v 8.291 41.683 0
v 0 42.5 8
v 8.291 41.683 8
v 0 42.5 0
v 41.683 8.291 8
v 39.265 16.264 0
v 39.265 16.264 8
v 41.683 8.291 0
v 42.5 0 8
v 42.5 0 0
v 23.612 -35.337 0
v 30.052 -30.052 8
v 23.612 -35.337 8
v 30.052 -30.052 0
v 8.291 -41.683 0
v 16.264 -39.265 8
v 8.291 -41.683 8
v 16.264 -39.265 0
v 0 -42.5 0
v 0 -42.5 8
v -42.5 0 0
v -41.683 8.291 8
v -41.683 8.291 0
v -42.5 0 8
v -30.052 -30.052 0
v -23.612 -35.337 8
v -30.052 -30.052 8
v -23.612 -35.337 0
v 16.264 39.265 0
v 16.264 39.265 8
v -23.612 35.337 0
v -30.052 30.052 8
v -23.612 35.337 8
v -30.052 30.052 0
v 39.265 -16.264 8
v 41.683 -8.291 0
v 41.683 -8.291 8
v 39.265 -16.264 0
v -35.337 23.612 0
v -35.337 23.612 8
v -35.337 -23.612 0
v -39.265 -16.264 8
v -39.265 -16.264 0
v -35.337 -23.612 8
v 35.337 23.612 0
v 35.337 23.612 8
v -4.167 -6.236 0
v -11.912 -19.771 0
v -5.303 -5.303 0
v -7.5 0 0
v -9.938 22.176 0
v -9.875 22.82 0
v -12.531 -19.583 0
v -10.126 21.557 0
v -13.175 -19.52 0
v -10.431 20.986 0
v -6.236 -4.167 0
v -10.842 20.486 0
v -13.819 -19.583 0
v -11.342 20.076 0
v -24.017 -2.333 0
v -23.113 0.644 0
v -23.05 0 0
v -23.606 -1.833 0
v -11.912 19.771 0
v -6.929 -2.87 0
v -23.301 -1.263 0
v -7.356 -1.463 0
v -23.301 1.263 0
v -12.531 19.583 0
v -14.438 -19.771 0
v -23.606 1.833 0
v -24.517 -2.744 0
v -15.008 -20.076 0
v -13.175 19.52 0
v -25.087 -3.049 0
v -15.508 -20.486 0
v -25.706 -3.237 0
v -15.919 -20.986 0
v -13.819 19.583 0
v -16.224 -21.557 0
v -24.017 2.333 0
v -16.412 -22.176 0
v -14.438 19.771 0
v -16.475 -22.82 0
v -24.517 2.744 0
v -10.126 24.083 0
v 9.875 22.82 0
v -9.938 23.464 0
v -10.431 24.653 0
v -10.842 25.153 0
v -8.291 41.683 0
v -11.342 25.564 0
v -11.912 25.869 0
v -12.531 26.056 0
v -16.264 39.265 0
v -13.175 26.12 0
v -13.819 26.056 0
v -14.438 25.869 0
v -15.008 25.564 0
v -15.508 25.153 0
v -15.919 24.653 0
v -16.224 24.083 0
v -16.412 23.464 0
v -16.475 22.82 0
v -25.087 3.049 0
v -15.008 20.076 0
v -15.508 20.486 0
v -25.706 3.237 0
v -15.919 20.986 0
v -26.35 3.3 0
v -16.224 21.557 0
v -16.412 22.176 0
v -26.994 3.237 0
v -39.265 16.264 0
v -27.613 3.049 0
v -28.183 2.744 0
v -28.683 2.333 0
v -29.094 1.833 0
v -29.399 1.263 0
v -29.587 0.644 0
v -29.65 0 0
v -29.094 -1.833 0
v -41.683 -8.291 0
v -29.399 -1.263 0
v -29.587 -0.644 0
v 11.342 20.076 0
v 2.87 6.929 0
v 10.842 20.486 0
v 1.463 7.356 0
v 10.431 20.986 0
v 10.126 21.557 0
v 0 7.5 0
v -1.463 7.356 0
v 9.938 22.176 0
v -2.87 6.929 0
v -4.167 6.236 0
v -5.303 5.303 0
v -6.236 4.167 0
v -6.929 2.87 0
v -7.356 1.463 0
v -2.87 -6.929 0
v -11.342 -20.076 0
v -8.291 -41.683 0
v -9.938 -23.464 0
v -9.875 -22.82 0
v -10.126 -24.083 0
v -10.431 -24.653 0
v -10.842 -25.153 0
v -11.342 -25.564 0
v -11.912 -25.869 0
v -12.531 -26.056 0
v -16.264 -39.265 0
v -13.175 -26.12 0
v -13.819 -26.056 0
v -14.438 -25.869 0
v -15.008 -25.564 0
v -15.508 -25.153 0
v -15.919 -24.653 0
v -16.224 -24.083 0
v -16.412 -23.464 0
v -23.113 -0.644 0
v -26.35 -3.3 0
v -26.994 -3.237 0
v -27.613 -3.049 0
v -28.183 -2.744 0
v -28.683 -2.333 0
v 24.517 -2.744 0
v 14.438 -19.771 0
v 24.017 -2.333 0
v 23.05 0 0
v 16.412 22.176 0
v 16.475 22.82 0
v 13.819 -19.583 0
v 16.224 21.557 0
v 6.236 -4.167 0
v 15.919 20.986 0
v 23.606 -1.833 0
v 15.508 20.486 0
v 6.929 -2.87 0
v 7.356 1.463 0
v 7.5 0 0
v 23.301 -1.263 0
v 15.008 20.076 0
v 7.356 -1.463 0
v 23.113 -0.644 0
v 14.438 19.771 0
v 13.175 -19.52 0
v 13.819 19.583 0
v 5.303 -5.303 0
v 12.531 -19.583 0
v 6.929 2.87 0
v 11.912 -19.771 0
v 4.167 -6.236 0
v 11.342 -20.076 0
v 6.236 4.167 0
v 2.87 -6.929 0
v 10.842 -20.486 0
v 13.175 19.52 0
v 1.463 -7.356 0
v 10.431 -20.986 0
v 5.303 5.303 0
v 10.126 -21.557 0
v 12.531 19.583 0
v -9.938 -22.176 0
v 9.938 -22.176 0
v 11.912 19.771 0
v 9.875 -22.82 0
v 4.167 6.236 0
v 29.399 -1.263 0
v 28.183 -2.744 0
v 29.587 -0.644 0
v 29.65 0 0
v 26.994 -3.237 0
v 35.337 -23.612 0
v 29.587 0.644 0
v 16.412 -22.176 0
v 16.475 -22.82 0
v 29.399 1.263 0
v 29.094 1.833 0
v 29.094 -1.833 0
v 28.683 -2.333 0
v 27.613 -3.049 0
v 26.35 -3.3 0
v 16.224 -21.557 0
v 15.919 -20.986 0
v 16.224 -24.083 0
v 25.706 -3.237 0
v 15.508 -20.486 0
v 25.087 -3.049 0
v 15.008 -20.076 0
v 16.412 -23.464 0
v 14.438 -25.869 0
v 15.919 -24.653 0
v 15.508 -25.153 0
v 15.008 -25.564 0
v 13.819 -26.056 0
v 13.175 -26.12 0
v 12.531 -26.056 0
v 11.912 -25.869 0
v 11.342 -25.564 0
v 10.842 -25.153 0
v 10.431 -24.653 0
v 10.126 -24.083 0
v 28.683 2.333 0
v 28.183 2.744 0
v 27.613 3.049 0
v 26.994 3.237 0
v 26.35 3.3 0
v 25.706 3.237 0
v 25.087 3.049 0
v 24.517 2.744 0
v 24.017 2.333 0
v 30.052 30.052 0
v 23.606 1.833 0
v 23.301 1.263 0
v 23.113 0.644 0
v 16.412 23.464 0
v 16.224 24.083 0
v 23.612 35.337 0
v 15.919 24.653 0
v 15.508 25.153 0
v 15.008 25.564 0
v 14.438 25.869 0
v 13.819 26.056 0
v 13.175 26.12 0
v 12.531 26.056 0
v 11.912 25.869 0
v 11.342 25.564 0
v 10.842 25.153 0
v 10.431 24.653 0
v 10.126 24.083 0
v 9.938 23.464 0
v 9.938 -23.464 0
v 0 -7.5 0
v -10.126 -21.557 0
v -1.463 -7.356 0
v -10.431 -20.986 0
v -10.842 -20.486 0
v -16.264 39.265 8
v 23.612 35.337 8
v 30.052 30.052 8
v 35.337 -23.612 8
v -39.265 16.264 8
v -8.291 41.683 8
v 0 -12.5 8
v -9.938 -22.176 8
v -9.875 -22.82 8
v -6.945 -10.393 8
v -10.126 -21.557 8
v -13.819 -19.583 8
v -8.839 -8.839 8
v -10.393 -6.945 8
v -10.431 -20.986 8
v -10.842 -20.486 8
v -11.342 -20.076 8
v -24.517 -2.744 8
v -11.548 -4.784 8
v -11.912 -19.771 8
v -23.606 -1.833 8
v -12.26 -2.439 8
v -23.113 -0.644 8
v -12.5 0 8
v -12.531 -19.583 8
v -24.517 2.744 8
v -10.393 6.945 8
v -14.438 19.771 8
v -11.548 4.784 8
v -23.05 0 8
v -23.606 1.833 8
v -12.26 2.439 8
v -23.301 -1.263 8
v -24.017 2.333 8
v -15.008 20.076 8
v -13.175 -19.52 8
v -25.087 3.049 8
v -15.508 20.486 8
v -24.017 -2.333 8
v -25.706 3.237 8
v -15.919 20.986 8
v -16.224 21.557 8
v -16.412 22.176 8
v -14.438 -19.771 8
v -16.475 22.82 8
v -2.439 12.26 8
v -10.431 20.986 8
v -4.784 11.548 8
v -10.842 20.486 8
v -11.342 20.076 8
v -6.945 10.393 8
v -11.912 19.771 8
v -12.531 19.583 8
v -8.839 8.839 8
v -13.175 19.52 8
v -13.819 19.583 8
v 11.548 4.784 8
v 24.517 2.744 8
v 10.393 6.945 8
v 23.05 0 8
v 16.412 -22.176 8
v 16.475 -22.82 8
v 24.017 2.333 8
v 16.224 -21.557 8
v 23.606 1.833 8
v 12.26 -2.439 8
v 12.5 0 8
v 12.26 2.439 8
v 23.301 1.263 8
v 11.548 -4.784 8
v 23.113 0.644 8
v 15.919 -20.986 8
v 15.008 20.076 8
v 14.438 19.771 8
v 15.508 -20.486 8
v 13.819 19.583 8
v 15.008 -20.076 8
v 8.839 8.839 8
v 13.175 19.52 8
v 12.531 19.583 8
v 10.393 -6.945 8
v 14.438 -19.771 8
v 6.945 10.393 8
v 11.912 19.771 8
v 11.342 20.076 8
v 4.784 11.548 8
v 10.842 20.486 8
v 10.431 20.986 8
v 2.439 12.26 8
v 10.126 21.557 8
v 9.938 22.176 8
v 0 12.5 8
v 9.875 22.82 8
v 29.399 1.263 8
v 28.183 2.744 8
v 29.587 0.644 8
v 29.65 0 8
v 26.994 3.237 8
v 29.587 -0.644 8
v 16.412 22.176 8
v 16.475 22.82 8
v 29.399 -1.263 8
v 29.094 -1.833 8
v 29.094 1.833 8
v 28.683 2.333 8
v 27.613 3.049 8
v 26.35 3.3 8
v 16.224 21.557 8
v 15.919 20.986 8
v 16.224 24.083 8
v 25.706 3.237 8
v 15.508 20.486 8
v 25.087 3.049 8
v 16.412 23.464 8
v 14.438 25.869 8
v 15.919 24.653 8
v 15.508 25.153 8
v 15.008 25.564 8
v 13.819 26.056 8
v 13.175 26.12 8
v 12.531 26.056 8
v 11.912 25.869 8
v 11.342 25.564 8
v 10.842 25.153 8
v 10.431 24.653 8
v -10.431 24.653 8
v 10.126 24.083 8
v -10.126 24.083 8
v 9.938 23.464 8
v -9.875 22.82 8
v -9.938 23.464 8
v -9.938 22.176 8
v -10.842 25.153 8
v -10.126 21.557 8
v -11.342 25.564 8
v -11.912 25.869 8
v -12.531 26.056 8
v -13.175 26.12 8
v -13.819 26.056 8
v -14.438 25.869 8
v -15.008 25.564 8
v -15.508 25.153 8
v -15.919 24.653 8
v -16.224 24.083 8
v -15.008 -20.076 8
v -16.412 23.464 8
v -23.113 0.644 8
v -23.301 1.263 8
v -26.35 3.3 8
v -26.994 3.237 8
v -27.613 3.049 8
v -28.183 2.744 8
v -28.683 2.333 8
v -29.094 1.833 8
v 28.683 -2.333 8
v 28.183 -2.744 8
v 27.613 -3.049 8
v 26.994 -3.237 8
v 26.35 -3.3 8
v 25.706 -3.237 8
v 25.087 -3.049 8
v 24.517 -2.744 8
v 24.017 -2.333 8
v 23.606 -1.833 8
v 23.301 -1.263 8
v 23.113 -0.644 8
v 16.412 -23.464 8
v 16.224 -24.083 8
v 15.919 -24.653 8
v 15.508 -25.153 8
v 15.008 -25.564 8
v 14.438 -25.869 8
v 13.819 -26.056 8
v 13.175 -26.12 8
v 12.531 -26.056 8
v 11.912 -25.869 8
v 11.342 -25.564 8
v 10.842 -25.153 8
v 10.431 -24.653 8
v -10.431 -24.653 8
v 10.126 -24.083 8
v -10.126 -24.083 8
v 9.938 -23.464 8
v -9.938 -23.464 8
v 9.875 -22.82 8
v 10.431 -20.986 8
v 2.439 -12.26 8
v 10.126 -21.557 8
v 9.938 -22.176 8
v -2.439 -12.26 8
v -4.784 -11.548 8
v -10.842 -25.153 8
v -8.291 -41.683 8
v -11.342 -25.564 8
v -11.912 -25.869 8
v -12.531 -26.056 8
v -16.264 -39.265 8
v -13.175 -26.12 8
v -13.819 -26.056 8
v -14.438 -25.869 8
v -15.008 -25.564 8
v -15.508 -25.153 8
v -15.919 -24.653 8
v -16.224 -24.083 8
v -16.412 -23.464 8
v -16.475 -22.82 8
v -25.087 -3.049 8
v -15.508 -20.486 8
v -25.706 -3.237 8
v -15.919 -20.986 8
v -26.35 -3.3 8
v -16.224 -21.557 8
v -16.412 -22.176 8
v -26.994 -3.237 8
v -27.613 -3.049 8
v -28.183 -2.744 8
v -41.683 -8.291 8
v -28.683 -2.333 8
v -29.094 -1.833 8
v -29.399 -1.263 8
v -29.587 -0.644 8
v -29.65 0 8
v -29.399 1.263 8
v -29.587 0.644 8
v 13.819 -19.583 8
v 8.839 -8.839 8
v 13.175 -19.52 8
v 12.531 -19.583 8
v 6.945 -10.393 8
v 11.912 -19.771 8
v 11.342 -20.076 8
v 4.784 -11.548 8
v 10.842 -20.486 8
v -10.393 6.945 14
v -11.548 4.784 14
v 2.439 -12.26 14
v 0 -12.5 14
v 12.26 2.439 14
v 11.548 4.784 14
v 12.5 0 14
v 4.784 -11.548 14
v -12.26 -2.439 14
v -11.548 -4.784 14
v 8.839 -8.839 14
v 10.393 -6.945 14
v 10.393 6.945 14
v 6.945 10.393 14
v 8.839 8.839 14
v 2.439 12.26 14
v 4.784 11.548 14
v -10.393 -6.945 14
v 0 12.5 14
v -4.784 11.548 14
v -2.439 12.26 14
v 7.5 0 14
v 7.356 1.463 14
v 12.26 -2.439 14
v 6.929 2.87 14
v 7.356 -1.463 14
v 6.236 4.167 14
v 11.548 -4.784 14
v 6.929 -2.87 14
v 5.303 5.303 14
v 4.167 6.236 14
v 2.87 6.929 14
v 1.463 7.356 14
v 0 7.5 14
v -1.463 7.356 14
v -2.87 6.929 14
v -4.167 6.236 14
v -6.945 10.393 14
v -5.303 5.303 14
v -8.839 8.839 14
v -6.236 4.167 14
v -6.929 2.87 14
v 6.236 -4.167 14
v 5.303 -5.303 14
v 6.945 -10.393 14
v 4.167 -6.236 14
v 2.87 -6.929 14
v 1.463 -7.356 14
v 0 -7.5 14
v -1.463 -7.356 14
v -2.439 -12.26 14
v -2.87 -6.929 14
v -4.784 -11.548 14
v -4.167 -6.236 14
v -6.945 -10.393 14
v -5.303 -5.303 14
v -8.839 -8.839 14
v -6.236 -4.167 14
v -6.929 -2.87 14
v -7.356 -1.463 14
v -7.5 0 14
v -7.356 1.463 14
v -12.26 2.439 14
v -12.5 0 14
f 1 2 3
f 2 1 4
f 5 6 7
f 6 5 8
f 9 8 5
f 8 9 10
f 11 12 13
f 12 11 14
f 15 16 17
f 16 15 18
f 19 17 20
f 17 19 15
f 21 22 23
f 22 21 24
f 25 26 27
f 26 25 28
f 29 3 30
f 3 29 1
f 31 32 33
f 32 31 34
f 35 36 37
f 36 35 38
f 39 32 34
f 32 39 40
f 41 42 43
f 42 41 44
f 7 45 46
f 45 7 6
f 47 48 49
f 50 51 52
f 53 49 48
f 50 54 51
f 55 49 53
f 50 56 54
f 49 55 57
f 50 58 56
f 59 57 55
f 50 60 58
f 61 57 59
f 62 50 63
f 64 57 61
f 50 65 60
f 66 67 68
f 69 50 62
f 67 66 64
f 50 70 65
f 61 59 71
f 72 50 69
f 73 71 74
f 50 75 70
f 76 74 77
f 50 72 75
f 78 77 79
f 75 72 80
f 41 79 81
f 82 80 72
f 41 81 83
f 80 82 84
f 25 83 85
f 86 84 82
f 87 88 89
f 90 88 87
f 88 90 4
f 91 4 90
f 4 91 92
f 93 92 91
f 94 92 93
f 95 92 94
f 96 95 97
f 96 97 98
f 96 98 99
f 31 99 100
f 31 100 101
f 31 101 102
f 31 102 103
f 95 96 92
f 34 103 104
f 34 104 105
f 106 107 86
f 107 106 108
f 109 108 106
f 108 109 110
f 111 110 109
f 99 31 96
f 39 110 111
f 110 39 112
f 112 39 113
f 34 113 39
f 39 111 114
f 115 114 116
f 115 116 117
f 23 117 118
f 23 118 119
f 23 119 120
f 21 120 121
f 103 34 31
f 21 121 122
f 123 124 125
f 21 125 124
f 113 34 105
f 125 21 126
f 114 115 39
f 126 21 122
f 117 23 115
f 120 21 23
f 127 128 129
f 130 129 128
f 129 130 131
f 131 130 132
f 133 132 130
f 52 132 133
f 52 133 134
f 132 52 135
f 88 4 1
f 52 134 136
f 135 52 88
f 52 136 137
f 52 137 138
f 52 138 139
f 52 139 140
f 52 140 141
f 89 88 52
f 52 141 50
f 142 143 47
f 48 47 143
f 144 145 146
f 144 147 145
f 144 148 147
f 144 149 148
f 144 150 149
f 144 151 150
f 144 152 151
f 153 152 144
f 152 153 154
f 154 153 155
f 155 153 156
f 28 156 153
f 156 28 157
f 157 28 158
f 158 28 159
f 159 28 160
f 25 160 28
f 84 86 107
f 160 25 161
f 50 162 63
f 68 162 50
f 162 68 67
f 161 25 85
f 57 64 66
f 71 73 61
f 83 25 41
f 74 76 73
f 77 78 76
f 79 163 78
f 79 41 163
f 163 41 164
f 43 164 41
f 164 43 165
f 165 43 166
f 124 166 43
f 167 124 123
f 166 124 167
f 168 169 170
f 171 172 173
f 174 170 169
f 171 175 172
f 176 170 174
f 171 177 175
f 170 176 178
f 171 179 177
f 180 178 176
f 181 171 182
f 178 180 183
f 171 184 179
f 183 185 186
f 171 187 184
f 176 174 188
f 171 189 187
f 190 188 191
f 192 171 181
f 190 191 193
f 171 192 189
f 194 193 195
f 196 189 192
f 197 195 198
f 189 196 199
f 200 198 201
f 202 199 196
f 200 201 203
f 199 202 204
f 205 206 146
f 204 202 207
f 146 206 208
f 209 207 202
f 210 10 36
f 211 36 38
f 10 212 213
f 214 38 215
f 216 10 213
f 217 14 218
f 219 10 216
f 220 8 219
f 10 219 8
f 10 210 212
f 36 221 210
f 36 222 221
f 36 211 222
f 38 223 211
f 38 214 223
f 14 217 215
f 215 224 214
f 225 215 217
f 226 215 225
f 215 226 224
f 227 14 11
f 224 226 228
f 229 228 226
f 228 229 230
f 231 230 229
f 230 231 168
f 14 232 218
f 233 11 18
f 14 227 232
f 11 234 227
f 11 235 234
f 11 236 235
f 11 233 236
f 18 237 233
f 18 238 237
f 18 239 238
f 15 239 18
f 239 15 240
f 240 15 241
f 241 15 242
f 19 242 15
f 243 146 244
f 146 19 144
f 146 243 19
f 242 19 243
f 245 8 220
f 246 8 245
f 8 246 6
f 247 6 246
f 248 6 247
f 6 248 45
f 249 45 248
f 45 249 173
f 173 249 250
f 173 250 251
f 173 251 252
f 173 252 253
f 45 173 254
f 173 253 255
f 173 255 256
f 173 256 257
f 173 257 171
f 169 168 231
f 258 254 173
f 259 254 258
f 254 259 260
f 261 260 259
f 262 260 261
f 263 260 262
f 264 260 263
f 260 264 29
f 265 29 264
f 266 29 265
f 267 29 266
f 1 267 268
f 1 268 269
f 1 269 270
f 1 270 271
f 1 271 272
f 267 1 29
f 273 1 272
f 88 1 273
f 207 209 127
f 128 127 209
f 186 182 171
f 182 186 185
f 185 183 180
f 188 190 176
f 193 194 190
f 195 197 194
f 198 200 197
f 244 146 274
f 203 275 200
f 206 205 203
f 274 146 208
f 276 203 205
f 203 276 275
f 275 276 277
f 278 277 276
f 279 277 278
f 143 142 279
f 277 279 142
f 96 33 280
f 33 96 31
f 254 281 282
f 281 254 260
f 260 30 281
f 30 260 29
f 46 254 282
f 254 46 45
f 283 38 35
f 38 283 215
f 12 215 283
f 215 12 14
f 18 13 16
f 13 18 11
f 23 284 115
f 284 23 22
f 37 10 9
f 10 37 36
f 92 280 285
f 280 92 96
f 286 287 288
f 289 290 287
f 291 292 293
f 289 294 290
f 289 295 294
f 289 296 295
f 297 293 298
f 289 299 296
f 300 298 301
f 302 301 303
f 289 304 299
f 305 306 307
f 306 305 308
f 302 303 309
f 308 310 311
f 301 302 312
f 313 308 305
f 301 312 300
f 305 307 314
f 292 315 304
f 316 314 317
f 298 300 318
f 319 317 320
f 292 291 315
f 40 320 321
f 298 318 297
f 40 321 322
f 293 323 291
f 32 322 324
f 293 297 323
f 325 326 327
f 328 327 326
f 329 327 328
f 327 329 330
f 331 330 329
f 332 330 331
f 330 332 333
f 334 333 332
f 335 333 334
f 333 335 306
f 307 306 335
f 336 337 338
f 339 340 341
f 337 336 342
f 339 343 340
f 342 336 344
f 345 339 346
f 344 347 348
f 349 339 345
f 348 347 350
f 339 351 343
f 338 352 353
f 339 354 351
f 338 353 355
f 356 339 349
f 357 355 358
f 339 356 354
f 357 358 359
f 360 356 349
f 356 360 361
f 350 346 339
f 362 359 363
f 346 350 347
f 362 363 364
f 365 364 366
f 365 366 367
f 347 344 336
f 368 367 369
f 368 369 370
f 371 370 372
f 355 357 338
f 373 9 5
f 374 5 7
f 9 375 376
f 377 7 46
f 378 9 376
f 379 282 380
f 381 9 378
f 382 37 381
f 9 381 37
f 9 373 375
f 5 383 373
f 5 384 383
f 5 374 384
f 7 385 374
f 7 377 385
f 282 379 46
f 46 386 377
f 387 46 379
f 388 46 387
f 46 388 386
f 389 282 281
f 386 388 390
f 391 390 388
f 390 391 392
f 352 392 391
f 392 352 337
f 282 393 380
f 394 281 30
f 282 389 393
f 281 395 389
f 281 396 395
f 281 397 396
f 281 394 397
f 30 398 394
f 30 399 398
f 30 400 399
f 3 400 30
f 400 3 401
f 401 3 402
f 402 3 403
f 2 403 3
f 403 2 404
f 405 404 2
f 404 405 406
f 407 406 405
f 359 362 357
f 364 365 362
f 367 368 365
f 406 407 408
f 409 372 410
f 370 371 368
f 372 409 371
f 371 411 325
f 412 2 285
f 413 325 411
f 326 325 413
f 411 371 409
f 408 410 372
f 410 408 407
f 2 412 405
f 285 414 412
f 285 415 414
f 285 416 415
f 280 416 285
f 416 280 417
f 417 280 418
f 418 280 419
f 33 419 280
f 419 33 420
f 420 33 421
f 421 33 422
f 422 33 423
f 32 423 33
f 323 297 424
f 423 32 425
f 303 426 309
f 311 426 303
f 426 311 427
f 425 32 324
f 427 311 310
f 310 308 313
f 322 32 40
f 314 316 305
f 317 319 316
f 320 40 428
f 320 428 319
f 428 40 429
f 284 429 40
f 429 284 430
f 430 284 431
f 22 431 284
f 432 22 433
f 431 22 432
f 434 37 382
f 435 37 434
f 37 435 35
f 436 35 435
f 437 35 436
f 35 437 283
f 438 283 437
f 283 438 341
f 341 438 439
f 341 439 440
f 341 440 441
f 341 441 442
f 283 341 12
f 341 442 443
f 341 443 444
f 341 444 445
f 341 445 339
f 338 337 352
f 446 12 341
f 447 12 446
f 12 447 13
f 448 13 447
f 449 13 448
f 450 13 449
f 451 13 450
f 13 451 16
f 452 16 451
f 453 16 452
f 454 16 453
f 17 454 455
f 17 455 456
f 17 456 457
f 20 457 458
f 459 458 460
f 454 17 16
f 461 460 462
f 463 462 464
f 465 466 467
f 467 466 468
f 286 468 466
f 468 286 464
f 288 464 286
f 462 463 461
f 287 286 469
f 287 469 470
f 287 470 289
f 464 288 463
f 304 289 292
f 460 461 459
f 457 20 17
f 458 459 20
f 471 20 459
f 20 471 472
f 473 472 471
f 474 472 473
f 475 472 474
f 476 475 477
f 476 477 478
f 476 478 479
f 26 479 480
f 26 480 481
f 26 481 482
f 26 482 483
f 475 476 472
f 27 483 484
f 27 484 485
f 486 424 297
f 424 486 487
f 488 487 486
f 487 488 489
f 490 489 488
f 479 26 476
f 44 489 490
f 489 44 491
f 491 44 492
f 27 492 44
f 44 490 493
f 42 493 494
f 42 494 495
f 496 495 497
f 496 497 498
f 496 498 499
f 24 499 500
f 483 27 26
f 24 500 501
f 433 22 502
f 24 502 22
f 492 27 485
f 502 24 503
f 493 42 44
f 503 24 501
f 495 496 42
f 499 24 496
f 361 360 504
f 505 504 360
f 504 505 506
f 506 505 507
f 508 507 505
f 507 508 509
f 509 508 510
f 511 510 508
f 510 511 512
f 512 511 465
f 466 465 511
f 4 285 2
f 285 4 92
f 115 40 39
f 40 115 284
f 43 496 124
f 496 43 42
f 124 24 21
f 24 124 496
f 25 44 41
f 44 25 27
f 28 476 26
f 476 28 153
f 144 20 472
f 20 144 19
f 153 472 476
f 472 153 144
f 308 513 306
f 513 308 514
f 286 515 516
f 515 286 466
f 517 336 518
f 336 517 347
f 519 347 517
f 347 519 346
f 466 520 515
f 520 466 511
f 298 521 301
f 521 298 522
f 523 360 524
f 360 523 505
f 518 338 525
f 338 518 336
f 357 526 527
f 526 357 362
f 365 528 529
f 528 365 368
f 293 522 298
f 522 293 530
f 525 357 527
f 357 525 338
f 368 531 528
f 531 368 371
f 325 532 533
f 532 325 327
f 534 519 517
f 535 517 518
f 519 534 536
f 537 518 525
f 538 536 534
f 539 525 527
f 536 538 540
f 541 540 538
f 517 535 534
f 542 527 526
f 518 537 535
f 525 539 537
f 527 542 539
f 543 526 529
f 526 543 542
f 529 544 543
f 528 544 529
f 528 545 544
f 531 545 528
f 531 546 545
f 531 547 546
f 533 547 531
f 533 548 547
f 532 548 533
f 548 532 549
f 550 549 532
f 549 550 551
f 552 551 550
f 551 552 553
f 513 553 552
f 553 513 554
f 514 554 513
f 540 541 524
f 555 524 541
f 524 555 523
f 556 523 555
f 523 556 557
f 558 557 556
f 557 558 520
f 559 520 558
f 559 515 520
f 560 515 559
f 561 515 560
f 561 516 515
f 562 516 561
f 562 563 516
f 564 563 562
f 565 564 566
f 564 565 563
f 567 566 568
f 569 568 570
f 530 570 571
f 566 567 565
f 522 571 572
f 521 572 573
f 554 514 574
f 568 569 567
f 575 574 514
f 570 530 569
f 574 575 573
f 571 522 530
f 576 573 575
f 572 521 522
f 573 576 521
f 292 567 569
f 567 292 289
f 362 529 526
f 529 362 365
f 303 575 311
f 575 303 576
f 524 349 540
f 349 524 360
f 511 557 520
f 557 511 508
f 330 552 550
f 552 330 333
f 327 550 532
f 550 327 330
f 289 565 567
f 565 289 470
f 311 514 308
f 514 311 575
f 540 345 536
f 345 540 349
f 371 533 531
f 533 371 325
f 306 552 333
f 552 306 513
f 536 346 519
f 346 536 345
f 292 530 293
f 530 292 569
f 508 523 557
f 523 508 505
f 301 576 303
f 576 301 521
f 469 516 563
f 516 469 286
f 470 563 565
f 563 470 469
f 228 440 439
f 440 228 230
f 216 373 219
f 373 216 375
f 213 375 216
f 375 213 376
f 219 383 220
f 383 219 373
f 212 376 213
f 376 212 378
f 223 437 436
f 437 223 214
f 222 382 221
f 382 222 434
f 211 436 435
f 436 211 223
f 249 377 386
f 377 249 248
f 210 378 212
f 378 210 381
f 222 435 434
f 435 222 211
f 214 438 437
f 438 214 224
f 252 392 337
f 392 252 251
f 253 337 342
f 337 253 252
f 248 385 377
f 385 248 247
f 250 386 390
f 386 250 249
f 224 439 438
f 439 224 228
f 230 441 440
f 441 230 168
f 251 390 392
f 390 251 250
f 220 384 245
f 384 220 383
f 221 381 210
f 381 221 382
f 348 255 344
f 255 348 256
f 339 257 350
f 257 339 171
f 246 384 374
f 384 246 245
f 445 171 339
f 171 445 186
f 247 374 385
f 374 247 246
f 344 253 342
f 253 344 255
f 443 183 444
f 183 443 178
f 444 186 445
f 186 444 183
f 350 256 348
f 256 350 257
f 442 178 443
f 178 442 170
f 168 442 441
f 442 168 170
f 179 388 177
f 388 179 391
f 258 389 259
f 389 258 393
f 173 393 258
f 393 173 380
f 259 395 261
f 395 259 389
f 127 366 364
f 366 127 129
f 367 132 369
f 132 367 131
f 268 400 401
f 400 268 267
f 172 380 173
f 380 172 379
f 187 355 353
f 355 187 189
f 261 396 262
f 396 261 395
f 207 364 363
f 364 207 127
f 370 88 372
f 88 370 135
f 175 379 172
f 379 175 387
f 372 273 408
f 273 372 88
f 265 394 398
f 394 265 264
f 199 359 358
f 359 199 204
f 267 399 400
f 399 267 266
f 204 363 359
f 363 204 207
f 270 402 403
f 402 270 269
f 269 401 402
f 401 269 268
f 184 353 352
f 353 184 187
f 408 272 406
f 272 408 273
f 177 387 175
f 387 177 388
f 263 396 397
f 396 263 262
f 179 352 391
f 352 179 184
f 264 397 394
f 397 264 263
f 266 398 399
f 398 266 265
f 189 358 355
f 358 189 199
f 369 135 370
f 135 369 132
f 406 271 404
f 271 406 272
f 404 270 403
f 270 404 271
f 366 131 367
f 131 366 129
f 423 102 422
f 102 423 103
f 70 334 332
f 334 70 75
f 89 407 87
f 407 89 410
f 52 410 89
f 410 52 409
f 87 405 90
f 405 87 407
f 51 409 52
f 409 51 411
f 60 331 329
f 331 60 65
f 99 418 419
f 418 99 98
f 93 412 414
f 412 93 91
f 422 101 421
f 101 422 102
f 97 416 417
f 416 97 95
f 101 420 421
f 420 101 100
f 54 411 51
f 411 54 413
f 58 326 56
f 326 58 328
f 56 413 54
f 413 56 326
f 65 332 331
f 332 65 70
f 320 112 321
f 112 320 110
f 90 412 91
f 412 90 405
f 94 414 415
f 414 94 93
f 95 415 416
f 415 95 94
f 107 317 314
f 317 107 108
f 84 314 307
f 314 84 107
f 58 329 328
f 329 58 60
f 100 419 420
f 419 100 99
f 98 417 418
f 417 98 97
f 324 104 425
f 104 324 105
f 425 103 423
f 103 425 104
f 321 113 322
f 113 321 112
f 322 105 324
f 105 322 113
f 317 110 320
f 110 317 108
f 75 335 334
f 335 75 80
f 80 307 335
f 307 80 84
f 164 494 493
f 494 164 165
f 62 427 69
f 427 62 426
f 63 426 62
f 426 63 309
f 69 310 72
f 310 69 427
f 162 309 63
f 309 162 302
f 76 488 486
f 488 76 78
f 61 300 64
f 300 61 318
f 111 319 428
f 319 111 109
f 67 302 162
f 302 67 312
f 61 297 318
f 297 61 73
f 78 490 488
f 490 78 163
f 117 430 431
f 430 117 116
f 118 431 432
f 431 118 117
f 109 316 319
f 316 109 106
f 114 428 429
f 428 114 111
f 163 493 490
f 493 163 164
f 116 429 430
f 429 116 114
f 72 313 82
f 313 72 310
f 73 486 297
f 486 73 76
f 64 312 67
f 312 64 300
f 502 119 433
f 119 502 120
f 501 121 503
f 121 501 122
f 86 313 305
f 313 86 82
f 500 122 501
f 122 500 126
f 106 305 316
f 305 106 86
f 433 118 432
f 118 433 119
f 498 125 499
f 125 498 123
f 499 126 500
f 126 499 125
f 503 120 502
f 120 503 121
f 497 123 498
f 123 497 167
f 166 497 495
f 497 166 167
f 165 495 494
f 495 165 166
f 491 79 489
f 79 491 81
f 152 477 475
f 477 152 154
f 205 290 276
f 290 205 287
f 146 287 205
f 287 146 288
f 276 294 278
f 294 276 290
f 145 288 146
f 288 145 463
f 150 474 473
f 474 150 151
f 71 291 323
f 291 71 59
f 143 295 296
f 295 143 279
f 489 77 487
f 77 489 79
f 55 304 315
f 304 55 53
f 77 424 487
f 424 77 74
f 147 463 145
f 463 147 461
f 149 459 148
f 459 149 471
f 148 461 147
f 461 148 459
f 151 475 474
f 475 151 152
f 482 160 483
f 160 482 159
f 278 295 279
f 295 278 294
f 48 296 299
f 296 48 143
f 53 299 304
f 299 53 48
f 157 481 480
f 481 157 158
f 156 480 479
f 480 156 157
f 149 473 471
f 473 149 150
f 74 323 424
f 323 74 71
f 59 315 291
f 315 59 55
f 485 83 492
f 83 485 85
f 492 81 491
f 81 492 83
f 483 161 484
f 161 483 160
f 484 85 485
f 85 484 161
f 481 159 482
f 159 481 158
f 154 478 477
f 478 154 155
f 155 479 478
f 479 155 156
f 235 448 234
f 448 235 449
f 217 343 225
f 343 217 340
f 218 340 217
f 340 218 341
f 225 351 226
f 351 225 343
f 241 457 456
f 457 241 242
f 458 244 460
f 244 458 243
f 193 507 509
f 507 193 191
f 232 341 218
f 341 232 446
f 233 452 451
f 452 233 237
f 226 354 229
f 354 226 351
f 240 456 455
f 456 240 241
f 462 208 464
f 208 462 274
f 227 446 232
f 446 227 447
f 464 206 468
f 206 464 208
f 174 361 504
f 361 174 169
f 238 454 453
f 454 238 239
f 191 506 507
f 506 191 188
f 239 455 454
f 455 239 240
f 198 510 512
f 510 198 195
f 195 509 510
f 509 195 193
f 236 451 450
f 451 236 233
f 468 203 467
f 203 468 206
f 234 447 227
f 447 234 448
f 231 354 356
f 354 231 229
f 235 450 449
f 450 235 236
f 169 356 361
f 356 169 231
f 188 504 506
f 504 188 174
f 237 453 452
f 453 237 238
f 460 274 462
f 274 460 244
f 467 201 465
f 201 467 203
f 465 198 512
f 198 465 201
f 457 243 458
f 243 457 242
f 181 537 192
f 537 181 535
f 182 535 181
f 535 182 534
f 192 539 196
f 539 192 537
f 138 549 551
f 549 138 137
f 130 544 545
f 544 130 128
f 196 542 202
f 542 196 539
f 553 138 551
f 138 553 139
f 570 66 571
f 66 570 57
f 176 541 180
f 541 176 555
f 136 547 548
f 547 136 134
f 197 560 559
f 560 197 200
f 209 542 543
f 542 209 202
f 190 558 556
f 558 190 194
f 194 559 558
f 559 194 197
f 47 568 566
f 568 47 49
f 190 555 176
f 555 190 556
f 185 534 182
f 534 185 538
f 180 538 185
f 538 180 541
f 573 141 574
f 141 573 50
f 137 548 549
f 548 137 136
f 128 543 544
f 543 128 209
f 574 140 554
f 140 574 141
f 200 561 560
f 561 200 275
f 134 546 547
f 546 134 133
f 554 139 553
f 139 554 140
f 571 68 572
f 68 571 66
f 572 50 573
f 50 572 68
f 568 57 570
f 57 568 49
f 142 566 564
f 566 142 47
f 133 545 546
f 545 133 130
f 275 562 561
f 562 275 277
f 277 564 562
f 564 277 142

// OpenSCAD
$fn = 32;

// ----------------------------------------------------------------------
// Flange Ø85 x 8
// 6 holes on a Ø52.7 bolt circle, bolted joints
// ----------------------------------------------------------------------

// --- parameters (mm) ---
flange_d = 85;  // outside diameter of the flange
thickness = 8;  // flange thickness
holes = 6;      // number of bolt holes
pcd = 52.7;     // bolt circle diameter
start_deg = 0;  // angle of the first hole, from +X
hole_d = 6.6;   // bolt hole diameter
bore_d = 15;    // central through bore
hub_d = 25;     // hub outside diameter
hub_h = 6;      // hub height above the flange face (0 = no hub)

// --- derived feature positions (mm) ---
height = thickness + hub_h;  // = 14   overall height of the part
pcd_r = pcd / 2;             // = 26.35   bolt circle radius
hole_step = 360 / holes;     // = 60   angular pitch
feature_centers = [
  [pcd_r * cos(start_deg + 0 * hole_step), pcd_r * sin(start_deg + 0 * hole_step)],
  [pcd_r * cos(start_deg + 1 * hole_step), pcd_r * sin(start_deg + 1 * hole_step)],
  [pcd_r * cos(start_deg + 2 * hole_step), pcd_r * sin(start_deg + 2 * hole_step)],
  [pcd_r * cos(start_deg + 3 * hole_step), pcd_r * sin(start_deg + 3 * hole_step)],
  [pcd_r * cos(start_deg + 4 * hole_step), pcd_r * sin(start_deg + 4 * hole_step)],
  [pcd_r * cos(start_deg + 5 * hole_step), pcd_r * sin(start_deg + 5 * hole_step)]
];   // bolt hole centres on the pitch circle

// flange disc, every hole and the bore cut straight through
difference() {
  union() {
    cylinder(d = flange_d, h = thickness);
    cylinder(d = hub_d, h = height);  // hub, overlapped into the flange
  }
  translate([0, 0, -1]) cylinder(d = bore_d, h = height + 2);  // bore, through
  for (centre = feature_centers)
    translate([centre[0], centre[1], -1]) cylinder(d = hole_d, h = thickness + 2);
}
